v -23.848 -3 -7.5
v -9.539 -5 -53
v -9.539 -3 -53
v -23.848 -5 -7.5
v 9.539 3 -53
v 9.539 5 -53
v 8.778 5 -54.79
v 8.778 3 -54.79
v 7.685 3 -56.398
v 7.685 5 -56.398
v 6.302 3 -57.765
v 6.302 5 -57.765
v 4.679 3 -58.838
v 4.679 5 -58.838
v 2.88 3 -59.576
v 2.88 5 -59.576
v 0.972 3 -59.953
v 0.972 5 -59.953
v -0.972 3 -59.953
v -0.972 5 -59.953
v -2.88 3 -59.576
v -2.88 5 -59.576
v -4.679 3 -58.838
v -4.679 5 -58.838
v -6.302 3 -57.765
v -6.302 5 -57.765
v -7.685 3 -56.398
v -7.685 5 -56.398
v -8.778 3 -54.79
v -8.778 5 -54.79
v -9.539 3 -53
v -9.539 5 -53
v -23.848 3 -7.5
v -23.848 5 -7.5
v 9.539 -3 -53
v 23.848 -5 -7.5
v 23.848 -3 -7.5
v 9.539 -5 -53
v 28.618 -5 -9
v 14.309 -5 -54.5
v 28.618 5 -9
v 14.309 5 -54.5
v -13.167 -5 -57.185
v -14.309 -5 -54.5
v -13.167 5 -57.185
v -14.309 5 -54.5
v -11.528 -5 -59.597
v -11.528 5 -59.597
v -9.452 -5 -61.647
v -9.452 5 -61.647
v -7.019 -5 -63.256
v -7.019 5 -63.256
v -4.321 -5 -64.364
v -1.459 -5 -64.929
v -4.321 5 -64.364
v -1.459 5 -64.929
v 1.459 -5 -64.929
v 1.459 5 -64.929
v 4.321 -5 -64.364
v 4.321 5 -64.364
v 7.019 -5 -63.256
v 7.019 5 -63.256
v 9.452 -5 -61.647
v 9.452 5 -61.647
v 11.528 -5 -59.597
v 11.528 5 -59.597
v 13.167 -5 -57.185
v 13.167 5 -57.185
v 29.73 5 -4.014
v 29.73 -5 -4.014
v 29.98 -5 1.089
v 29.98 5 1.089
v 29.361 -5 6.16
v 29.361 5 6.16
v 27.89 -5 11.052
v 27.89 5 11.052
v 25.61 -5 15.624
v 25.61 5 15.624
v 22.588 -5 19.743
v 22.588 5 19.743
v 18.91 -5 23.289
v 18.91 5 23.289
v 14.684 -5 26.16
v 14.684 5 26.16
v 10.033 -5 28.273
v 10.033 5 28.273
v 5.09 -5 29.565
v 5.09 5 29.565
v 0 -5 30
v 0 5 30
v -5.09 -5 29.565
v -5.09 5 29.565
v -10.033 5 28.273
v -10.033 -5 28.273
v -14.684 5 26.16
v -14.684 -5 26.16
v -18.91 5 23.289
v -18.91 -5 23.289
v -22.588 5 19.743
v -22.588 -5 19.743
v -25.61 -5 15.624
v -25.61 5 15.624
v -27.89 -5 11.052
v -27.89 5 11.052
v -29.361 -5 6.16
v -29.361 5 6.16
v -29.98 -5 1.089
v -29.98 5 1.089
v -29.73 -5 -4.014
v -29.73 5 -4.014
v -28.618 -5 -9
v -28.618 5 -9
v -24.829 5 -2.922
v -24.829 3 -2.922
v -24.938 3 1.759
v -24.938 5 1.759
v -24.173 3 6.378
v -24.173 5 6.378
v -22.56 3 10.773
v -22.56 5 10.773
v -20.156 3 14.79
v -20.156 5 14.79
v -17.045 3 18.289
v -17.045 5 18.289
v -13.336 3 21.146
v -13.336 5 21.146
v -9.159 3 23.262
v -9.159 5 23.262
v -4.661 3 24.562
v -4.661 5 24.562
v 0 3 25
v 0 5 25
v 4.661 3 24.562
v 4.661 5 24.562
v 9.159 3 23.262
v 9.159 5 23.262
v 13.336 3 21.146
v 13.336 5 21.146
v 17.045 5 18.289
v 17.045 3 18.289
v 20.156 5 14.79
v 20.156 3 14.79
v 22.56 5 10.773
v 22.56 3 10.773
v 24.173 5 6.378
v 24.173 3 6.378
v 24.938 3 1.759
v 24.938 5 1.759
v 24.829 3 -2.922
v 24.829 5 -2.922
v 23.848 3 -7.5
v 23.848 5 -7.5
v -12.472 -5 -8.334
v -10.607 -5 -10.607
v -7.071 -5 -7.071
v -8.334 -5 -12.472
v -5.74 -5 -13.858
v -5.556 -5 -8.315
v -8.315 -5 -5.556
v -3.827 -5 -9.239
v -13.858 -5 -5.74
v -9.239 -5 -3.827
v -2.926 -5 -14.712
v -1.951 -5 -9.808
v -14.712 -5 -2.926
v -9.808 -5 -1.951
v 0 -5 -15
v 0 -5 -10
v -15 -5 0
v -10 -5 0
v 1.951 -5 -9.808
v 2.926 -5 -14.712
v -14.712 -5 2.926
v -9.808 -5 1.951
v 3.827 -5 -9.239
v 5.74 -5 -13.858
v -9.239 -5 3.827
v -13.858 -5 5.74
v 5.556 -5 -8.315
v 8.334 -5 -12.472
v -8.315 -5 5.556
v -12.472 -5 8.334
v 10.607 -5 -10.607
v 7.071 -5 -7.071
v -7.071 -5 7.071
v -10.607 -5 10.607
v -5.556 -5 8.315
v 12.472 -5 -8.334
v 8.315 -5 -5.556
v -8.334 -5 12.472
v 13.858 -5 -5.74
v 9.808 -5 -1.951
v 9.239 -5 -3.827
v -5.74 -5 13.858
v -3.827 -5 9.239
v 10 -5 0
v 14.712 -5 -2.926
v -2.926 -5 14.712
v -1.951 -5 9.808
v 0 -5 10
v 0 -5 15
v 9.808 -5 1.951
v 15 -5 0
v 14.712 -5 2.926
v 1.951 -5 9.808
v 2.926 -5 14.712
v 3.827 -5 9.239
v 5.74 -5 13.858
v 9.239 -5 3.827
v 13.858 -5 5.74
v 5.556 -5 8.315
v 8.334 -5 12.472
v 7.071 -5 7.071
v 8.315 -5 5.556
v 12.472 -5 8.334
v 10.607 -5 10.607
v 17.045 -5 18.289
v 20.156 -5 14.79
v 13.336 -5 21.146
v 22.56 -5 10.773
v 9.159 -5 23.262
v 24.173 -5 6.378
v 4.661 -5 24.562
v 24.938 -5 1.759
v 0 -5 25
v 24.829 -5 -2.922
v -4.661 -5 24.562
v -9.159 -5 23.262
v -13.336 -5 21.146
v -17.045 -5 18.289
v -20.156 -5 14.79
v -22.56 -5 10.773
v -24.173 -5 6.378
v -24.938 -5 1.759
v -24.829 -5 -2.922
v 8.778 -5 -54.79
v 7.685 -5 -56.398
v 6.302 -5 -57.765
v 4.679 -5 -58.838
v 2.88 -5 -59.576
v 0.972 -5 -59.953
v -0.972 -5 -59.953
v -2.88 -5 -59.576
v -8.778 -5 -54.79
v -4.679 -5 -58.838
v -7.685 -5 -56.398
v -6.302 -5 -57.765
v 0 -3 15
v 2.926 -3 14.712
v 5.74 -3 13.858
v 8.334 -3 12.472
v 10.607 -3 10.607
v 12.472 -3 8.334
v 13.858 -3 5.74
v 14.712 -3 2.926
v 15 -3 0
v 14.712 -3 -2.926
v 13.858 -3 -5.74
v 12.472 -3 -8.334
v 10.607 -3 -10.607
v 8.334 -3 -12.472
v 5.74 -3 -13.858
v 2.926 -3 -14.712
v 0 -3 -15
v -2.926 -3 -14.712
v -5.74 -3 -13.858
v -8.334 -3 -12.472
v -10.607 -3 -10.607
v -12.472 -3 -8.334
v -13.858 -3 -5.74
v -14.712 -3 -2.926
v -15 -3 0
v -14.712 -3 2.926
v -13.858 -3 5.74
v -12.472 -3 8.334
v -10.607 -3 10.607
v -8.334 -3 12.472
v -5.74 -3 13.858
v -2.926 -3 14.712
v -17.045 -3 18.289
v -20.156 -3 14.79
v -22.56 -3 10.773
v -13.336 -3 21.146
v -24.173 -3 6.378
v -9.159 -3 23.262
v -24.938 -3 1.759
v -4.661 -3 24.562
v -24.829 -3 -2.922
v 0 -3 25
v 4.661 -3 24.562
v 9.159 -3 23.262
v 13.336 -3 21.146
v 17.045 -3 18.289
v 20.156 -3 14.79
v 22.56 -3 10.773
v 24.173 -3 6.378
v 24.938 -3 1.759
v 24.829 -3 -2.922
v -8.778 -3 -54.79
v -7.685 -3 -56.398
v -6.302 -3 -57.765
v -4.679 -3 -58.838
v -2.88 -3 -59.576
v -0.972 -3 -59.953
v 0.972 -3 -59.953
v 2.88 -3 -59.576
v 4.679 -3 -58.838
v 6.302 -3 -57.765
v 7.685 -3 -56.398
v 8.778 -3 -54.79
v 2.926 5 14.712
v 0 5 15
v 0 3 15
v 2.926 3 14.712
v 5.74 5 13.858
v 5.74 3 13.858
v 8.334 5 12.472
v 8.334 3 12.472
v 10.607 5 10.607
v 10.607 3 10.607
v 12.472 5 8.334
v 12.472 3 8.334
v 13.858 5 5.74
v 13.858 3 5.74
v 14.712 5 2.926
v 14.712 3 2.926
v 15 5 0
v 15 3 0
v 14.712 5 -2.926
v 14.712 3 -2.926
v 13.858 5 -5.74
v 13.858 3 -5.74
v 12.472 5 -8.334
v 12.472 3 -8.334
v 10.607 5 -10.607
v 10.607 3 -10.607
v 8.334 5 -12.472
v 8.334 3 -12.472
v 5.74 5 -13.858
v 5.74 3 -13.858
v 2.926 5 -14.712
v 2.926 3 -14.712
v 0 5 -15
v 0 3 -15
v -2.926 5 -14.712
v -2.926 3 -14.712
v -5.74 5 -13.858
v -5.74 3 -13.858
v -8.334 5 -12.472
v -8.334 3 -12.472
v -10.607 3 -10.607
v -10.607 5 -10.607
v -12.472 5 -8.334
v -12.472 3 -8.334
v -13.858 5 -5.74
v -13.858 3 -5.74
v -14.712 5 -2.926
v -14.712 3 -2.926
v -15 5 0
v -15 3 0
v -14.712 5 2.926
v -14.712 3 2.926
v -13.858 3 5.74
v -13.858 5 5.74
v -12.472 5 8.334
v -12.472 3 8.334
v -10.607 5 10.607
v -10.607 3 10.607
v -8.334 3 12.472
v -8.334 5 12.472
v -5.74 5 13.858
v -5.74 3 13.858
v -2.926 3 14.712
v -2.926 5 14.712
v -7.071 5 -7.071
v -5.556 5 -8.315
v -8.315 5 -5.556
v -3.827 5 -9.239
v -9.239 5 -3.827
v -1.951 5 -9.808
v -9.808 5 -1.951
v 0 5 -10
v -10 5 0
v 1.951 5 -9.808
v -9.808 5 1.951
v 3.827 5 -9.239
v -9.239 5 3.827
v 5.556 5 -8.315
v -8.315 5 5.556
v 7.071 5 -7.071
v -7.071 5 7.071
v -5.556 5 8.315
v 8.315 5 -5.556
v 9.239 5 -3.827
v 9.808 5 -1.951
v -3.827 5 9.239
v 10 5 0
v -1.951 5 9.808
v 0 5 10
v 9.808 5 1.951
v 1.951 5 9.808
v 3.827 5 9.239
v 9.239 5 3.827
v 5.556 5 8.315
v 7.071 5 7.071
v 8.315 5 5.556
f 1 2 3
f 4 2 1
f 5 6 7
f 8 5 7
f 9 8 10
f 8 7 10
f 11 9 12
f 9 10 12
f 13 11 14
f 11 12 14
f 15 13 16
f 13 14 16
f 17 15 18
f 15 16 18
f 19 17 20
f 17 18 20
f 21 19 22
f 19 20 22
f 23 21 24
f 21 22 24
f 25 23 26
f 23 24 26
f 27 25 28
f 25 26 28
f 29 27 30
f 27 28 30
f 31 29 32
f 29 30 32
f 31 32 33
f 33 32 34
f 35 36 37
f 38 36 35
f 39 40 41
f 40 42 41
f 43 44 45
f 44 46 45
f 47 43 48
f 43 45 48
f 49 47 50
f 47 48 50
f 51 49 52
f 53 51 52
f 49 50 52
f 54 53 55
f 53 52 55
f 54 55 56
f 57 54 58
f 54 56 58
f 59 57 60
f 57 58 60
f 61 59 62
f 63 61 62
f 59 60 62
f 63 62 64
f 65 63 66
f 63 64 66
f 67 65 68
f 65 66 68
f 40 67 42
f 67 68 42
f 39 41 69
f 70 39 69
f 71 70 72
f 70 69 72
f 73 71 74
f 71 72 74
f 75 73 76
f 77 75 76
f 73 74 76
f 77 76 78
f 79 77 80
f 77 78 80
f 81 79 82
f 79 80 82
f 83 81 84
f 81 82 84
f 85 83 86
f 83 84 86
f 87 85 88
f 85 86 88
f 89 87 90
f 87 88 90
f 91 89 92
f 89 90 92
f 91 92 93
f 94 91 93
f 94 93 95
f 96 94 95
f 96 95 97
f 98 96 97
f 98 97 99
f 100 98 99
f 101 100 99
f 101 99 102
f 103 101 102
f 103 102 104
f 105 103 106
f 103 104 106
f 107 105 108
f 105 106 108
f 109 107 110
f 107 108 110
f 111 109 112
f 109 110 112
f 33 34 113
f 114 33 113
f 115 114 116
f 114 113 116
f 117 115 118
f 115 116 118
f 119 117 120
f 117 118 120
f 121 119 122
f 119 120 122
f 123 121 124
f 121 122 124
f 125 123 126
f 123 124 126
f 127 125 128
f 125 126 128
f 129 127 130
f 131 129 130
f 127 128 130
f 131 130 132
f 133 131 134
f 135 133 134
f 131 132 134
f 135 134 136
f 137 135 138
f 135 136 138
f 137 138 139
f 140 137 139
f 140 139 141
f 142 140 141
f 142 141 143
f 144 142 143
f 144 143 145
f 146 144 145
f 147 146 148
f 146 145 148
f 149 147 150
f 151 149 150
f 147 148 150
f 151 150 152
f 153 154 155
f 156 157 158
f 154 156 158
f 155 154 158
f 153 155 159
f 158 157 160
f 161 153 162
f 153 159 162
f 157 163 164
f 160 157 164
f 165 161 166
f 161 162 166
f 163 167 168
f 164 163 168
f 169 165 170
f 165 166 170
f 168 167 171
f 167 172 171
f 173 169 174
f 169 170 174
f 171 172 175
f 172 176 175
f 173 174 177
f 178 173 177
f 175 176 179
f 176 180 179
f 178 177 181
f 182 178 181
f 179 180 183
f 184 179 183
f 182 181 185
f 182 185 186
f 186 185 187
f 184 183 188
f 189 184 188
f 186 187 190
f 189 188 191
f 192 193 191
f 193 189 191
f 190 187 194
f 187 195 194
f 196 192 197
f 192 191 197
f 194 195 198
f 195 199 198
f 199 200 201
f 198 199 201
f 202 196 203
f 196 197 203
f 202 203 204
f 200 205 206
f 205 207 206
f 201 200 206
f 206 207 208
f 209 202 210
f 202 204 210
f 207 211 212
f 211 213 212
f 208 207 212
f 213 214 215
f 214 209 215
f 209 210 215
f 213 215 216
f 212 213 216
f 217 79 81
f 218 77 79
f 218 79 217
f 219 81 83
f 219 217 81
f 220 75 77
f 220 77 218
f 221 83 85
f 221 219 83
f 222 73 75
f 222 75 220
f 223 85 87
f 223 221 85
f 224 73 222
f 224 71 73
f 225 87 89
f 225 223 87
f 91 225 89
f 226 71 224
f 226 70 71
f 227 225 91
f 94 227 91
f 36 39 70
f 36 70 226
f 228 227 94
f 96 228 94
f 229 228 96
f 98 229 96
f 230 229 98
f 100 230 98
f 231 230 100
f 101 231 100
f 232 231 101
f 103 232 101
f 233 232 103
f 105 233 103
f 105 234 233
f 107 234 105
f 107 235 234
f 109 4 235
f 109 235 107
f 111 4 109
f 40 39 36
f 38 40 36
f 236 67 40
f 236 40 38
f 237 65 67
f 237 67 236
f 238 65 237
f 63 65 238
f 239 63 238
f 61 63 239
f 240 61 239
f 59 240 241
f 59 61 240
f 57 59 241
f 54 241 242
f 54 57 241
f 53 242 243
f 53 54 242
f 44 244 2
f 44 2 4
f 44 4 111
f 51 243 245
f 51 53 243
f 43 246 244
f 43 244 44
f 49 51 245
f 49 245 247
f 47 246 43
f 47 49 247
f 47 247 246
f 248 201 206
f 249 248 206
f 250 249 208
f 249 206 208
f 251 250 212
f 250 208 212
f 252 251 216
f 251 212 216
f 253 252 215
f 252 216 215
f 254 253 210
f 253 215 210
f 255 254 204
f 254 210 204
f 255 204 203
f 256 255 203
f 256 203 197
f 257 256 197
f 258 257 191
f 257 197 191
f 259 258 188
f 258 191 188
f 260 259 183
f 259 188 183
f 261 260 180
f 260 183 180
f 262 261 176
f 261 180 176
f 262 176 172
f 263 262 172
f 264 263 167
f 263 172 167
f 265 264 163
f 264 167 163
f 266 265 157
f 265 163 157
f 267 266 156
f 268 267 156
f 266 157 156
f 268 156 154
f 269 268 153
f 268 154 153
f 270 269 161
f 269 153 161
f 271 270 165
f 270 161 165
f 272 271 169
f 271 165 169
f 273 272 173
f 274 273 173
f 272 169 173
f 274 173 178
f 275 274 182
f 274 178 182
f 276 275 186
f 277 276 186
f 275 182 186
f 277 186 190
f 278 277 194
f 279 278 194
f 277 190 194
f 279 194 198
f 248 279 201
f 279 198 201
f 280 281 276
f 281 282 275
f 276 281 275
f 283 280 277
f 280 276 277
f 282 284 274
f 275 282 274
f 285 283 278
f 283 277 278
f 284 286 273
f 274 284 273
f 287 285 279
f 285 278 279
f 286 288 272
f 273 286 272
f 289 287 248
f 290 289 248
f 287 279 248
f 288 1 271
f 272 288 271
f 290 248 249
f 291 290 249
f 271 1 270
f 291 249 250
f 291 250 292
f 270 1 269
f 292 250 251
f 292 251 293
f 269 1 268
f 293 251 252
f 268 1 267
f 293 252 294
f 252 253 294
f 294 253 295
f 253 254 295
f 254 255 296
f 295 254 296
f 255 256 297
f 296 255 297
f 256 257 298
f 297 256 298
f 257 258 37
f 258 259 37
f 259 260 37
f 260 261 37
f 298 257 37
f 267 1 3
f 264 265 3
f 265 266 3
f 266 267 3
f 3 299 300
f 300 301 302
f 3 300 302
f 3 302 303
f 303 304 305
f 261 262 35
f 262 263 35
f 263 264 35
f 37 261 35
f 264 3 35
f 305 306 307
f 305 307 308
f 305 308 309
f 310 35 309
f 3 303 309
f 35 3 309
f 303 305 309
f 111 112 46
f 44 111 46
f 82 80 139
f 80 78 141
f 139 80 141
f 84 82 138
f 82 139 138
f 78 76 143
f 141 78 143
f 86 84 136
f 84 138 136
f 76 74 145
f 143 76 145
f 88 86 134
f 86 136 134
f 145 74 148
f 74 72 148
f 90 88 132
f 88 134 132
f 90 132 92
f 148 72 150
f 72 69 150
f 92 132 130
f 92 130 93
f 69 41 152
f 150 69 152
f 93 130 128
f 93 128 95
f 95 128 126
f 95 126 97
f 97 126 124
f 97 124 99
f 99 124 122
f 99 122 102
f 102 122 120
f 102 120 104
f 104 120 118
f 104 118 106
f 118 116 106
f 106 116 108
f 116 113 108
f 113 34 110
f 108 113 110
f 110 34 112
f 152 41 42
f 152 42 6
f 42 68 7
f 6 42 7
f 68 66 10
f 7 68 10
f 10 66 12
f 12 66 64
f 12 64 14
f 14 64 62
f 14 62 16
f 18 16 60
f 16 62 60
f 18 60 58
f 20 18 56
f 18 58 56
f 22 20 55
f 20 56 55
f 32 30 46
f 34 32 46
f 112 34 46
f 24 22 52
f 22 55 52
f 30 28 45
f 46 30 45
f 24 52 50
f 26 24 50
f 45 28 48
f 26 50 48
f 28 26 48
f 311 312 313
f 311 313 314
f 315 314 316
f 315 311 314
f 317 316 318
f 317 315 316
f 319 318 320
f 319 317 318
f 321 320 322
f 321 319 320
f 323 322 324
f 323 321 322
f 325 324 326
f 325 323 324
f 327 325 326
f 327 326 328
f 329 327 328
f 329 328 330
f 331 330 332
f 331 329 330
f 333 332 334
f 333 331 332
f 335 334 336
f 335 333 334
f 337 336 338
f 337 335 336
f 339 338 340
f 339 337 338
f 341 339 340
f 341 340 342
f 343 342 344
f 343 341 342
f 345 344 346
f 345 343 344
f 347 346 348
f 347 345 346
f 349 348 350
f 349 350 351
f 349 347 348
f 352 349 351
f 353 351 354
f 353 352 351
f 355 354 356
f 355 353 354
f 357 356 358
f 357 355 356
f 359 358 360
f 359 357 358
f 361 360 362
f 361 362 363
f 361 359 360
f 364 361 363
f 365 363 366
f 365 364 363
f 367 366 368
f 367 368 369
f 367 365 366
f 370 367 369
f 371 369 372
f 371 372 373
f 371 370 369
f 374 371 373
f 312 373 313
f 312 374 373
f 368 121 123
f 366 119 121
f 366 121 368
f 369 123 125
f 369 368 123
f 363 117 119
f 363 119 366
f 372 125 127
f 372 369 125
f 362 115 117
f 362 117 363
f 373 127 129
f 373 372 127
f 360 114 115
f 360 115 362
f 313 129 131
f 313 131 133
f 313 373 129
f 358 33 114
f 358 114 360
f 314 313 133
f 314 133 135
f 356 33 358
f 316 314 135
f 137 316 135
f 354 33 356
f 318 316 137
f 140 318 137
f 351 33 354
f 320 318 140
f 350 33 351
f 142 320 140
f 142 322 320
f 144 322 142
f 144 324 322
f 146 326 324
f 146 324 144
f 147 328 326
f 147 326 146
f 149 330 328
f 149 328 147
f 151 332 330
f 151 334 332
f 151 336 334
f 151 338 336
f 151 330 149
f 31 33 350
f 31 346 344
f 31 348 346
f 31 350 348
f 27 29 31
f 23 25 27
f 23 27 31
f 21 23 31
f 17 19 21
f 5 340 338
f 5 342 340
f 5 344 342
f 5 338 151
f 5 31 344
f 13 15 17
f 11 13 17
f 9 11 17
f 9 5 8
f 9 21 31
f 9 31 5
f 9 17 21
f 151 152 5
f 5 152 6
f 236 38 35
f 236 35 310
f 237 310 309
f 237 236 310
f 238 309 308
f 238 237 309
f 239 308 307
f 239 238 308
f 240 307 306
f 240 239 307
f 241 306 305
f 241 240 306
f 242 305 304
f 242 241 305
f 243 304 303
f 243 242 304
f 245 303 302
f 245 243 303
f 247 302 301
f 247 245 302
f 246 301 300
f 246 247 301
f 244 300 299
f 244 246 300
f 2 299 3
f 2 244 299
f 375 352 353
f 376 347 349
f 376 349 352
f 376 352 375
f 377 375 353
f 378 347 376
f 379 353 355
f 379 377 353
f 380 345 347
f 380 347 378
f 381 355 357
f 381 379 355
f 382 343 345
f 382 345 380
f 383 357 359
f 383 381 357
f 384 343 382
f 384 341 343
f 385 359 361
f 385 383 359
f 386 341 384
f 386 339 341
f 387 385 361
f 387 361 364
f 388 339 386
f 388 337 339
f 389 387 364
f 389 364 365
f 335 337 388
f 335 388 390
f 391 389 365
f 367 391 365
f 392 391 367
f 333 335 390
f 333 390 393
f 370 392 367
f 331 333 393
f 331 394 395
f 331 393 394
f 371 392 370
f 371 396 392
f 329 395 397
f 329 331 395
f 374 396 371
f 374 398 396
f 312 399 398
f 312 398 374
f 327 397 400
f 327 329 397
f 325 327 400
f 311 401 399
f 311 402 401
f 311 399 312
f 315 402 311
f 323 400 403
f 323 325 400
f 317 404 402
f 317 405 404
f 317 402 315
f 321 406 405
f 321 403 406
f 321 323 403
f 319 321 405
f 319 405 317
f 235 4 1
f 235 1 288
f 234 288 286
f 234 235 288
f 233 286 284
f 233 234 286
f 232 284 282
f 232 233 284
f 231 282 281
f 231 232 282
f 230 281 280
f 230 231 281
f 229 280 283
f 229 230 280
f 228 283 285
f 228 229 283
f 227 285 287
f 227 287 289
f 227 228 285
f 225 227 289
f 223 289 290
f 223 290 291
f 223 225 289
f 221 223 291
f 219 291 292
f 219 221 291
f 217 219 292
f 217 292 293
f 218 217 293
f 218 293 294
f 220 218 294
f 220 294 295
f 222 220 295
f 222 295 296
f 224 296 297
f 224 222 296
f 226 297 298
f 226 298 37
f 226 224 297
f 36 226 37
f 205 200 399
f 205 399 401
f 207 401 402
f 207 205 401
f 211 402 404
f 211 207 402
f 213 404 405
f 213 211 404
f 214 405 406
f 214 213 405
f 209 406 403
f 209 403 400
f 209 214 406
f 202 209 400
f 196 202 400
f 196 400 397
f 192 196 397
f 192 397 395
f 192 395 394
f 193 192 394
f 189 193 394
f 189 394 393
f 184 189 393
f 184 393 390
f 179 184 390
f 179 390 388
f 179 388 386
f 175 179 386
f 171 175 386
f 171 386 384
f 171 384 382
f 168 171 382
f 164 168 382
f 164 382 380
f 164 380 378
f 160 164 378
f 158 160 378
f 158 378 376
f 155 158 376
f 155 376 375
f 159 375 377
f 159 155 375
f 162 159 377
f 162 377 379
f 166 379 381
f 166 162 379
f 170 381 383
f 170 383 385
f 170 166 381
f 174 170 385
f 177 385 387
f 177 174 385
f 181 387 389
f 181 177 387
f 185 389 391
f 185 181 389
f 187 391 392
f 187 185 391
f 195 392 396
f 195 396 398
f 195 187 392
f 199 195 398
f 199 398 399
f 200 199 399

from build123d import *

# Parameters (mm, degrees)
BOSS_EXTRUDE1_DEPTH = 5
CUT_EXTRUDE1_DEPTH  = 2
SKETCH3_R           = 10
CUT_EXTRUDE4_DEPTH  = 73.034713854
BOSS_EXTRUDE2_START = 2
SKETCH5_R           = 15
SKETCH5_R_2         = 10
BOSS_EXTRUDE2_DEPTH = 2


with BuildPart() as part:
    # Sketch1 → Boss-Extrude1 (new, symmetric)
    with BuildSketch(Plane(origin=(0, 0, 0), x_dir=(1, 0, 0), z_dir=(0, 1, 0))):
        with BuildLine():
            Line((-28.618176043, 9), (-14.309088021, 54.5))
            ThreePointArc((-14.309088021, 54.5), (0, 65), (14.309088021, 54.5))
            Line((14.309088021, 54.5), (28.618176043, 9))
            ThreePointArc((28.618176043, 9), (0, -30), (-28.618176043, 9))
        make_face()
    extrude(amount=BOSS_EXTRUDE1_DEPTH, both=True)

    # Sketch2 → Cut-Extrude1 (cut)
    with BuildSketch(Plane(origin=(0, 5, 0), x_dir=(1, 0, 0), z_dir=(0, 1, 0))):
        with BuildLine():
            Line((-9.539392014, 53), (-23.848480035, 7.5))
            ThreePointArc((-23.848480035, 7.5), (0, -25), (23.848480035, 7.5))
            Line((23.848480035, 7.5), (9.539392014, 53))
            ThreePointArc((9.539392014, 53), (0, 60), (-9.539392014, 53))
        make_face()
    cut_extrude1 = extrude(amount=-CUT_EXTRUDE1_DEPTH, mode=Mode.SUBTRACT)

    # Mirror1: Cut-Extrude1 across plane
    add(cut_extrude1.mirror(Plane.ZX), mode=Mode.SUBTRACT)

    # Sketch3 → Cut-Extrude4 (cut, through all)
    with BuildSketch(Plane(origin=(0, 3, 0), x_dir=(1, 0, 0), z_dir=(0, 1, 0))):
        with Locations(Location((0, 0, 0), (0, 0, 270))):
            Circle(SKETCH3_R)
    extrude(amount=-CUT_EXTRUDE4_DEPTH, mode=Mode.SUBTRACT)

    # Sketch5 → Boss-Extrude2 (add)
    with BuildSketch(Plane(origin=(0, 3, 0), x_dir=(1, 0, 0), z_dir=(0, 1, 0)).offset(BOSS_EXTRUDE2_START)):
        with Locations(Location((0, 0, 0), (0, 0, 270))):
            Circle(SKETCH5_R)
        with Locations(Location((0, 0, 0), (0, 0, 270))):
            Circle(SKETCH5_R_2, mode=Mode.SUBTRACT)
    boss_extrude2 = extrude(amount=-BOSS_EXTRUDE2_DEPTH)

    # Mirror2: Boss-Extrude2 across plane
    add(boss_extrude2.mirror(Plane.ZX))


solid = part.part
